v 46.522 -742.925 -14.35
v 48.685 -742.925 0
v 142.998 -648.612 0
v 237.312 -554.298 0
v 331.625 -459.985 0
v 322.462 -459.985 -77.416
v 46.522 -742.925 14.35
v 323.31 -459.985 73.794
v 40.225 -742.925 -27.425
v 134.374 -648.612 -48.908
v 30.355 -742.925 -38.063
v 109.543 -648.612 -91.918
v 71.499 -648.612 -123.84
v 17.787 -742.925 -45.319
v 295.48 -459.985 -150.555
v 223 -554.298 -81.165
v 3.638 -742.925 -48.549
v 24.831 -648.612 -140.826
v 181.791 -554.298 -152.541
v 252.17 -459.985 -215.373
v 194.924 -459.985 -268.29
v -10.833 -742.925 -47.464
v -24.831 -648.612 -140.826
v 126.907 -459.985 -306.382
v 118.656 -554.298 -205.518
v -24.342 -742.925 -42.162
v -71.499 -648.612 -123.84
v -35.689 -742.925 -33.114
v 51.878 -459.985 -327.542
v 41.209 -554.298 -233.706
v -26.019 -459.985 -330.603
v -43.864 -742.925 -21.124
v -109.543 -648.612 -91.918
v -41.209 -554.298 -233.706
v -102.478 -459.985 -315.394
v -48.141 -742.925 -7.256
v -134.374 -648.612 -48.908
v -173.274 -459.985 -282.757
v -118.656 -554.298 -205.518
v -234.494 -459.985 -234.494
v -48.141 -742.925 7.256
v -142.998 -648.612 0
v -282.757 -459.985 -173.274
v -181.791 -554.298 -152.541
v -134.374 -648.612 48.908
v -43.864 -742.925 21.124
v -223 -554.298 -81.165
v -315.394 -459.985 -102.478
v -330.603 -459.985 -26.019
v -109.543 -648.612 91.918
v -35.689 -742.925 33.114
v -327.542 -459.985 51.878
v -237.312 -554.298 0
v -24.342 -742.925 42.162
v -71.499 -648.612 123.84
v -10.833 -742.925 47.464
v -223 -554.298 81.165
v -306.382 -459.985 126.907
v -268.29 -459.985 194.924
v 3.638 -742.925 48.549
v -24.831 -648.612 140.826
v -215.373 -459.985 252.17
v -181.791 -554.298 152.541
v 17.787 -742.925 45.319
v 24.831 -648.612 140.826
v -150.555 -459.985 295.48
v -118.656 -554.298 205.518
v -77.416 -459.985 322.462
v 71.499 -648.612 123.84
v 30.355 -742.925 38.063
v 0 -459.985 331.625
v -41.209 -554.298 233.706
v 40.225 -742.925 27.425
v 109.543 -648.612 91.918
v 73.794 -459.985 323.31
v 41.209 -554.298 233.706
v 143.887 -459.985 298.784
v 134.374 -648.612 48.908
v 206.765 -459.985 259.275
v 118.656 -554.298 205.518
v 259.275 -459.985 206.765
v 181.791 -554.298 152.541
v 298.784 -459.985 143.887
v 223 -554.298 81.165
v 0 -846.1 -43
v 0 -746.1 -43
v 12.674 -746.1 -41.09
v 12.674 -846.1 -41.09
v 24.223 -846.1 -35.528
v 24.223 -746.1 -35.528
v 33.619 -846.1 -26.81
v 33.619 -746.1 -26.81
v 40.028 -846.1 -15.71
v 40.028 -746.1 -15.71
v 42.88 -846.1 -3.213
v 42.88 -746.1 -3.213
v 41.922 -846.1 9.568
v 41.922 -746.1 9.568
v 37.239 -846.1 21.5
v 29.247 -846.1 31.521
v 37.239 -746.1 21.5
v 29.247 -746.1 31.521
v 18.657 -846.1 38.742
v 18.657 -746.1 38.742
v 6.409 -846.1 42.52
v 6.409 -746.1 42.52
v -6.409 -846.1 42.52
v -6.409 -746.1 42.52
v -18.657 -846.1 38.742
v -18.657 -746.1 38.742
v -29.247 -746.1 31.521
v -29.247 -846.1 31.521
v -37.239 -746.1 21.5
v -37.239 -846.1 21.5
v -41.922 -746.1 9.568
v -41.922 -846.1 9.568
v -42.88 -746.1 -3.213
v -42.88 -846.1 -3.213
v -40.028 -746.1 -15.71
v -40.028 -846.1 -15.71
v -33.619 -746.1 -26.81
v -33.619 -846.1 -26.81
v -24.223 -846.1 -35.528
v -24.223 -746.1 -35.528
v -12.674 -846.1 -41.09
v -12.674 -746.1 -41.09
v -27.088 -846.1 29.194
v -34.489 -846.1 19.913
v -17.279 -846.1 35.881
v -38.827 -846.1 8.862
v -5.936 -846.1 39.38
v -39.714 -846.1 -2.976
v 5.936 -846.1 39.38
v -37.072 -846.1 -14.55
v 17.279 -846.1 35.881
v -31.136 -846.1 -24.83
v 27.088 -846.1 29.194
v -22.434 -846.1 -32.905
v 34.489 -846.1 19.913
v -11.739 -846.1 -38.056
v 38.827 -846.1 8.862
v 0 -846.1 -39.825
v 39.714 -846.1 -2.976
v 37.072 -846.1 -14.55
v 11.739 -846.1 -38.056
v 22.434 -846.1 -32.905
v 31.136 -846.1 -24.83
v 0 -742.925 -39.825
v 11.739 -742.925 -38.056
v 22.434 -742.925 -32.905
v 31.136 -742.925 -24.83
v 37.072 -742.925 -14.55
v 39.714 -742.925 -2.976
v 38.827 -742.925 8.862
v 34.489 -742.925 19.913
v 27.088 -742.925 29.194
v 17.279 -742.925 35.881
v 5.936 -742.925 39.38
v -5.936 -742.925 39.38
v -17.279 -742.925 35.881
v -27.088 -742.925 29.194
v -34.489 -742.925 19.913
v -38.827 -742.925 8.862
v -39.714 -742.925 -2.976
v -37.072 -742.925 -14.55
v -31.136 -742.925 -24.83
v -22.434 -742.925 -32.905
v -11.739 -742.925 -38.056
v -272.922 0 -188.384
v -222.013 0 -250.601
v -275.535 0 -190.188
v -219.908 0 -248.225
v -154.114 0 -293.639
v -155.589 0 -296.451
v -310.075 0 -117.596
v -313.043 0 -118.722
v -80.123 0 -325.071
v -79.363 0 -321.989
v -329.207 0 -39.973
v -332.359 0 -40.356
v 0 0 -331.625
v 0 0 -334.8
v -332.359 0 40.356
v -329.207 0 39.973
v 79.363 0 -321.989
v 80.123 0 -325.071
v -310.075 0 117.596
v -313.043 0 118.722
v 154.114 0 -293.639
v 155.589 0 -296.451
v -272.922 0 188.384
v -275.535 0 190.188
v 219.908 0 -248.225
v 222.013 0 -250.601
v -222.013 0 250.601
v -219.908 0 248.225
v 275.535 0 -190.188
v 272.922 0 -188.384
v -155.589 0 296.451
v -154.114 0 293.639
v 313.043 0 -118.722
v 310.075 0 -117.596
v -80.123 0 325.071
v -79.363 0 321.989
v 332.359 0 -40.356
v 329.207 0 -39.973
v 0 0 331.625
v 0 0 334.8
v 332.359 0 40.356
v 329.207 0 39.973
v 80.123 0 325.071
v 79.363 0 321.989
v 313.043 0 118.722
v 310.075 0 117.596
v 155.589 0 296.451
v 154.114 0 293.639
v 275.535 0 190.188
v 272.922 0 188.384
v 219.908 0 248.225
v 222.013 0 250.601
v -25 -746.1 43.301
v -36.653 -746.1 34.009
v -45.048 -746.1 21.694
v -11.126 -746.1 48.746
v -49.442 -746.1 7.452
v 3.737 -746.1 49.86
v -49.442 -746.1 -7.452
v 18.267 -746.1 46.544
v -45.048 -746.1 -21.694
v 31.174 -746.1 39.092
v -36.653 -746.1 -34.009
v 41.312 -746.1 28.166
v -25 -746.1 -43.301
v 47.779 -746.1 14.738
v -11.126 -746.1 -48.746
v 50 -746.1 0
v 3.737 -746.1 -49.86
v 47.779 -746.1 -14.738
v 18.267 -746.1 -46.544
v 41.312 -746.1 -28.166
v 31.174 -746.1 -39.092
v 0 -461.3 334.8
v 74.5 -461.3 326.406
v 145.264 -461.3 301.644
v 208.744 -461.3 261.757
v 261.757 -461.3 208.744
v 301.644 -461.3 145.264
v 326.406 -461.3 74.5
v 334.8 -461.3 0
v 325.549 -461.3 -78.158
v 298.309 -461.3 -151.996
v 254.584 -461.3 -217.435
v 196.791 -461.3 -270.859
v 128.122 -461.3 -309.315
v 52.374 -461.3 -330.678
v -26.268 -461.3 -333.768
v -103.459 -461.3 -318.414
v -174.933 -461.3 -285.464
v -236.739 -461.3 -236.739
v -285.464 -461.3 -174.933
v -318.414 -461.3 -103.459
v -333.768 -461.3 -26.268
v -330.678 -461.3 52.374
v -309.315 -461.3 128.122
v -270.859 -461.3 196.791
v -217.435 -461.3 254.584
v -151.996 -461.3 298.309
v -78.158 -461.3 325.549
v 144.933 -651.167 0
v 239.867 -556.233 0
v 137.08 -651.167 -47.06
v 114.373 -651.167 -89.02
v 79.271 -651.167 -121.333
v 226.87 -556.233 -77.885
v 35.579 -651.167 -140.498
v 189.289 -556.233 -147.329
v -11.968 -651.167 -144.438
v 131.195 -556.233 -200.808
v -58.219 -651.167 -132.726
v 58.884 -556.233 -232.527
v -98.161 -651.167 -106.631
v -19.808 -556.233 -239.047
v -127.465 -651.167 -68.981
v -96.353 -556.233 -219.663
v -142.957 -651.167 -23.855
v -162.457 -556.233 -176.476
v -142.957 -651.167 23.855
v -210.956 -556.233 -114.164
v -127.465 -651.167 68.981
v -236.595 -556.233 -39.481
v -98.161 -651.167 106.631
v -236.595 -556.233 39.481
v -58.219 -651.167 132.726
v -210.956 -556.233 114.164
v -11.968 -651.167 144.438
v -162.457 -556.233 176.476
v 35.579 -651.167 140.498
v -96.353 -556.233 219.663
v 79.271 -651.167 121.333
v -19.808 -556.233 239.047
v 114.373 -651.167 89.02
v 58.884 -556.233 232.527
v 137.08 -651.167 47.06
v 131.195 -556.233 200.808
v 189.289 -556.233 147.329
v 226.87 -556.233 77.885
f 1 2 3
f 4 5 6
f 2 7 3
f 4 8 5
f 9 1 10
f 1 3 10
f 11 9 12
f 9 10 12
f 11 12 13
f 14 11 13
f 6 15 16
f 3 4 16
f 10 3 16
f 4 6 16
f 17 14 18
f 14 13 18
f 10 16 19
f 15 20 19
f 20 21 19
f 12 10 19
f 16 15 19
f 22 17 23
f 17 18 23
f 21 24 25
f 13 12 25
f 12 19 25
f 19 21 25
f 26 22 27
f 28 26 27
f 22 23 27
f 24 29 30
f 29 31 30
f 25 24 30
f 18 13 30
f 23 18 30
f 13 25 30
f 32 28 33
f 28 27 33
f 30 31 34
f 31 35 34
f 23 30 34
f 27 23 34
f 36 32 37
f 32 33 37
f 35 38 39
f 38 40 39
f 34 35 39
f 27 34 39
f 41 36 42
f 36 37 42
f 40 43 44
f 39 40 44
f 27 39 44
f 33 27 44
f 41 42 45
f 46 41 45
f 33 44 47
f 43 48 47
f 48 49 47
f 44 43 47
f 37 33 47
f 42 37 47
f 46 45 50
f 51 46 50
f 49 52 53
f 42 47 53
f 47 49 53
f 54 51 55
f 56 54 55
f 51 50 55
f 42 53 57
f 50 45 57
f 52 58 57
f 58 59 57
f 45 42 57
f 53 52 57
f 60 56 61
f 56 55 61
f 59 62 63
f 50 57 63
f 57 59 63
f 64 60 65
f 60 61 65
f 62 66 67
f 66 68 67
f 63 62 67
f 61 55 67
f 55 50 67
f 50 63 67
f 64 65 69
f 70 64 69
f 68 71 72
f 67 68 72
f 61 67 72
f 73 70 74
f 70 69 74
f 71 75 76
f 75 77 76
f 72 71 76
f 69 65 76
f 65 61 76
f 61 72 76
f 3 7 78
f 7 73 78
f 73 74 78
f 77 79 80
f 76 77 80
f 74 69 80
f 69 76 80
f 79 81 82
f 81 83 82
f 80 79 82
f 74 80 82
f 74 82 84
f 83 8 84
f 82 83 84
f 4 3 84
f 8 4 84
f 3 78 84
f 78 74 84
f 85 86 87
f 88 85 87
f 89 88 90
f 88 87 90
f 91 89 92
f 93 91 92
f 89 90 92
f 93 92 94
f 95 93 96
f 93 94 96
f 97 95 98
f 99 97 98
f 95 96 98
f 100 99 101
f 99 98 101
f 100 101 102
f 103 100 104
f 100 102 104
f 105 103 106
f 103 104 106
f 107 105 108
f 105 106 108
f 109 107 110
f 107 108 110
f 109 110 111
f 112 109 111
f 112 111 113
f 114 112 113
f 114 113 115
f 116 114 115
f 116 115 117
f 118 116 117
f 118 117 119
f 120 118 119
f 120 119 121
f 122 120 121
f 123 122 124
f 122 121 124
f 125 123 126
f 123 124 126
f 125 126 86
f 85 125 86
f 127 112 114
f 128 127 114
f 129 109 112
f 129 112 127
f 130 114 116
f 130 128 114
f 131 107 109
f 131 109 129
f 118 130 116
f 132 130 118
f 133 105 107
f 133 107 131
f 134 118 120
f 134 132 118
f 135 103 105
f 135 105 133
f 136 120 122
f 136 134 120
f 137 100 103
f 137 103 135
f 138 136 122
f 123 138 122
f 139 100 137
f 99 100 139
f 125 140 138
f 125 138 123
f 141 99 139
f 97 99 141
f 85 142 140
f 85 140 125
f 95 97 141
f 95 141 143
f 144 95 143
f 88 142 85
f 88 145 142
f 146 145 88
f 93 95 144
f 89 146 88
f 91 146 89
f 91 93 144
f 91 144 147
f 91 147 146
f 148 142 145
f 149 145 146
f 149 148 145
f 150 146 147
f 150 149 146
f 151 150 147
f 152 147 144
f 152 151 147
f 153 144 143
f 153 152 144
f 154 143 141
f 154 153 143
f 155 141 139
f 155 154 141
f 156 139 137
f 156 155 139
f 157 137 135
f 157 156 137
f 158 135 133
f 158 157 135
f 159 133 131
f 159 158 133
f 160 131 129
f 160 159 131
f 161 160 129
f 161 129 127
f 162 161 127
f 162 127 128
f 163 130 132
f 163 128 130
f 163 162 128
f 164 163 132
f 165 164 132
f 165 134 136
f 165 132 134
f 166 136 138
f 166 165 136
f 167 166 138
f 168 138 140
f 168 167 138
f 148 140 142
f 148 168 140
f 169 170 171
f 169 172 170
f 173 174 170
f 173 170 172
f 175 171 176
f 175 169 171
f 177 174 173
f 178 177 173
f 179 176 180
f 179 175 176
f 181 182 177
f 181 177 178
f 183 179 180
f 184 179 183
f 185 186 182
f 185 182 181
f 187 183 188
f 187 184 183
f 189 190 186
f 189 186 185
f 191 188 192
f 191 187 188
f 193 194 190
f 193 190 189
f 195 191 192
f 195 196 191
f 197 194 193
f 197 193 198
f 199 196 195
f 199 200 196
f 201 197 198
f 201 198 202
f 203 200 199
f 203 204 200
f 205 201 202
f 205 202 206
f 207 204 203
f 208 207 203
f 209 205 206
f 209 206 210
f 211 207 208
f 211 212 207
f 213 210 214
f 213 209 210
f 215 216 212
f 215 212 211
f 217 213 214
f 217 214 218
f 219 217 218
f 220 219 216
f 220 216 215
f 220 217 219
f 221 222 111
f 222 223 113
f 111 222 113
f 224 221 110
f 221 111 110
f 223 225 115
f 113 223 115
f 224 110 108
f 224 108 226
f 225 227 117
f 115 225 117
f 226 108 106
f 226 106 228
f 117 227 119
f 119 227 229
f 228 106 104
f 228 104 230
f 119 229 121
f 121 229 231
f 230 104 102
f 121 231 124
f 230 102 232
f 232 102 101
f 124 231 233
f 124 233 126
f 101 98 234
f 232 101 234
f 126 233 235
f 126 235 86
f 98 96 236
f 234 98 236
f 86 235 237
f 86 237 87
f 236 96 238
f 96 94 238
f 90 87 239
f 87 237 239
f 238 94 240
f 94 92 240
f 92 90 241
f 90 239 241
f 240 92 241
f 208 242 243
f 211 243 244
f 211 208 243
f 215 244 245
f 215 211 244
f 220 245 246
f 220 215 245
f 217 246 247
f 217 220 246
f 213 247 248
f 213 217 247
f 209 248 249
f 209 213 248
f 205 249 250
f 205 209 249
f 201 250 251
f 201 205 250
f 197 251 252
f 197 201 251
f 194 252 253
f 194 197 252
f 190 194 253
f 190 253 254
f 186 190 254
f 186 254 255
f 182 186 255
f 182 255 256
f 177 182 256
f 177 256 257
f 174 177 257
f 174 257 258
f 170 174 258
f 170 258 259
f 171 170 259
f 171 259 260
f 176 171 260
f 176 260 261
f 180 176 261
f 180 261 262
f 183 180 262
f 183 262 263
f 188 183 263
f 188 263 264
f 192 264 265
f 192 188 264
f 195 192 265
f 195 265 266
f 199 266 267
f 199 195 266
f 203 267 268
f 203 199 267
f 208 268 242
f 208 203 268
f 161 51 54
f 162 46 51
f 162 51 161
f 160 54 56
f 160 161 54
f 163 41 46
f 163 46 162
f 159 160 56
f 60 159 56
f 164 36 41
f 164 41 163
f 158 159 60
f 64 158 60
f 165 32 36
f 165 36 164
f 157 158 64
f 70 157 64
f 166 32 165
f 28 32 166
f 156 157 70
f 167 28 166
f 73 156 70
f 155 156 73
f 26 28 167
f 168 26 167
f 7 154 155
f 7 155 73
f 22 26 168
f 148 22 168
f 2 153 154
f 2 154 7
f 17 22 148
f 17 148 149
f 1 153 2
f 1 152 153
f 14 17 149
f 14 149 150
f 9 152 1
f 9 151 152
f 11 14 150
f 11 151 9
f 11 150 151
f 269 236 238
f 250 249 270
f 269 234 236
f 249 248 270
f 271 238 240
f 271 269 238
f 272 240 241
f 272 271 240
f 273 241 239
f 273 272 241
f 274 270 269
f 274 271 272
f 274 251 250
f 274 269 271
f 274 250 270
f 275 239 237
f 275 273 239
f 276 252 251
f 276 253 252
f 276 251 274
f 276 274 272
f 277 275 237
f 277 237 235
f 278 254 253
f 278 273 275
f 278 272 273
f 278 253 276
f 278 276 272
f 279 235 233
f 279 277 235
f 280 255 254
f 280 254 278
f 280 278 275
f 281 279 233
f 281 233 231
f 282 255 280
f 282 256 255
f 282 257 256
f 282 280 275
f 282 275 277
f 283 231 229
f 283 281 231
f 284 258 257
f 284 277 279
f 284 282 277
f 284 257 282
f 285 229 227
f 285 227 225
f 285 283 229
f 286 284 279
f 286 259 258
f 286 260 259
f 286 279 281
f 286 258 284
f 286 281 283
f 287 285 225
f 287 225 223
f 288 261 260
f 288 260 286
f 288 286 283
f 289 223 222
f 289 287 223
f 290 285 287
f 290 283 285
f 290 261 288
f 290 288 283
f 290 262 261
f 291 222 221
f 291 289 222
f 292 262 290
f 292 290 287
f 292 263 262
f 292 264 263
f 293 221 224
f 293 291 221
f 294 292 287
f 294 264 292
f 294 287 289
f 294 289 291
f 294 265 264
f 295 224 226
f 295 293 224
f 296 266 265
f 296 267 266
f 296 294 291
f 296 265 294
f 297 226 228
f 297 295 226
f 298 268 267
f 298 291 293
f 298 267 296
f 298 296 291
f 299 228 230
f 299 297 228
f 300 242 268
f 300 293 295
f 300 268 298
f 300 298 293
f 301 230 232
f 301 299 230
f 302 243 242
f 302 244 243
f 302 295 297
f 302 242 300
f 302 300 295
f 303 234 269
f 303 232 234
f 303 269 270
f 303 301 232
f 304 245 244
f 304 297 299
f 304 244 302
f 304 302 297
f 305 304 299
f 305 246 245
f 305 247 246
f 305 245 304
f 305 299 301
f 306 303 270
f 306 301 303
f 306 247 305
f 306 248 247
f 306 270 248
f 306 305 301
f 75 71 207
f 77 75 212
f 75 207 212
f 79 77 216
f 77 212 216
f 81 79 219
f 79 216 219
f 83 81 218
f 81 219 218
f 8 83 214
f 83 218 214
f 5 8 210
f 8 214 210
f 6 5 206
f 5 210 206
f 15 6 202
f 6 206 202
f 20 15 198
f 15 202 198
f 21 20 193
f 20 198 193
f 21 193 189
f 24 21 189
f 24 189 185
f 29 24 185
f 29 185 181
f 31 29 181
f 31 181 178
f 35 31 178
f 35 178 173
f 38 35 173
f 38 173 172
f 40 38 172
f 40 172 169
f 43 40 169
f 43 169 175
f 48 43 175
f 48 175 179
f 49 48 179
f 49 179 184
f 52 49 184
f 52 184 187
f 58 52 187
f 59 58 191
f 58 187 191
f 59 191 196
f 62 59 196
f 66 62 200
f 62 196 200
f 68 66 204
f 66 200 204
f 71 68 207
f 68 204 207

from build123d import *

# Parameters (mm, degrees)
CROQUIS1_R              = 334.8
SALIENTE_EXTRUIR1_DEPTH = 461.3
CROQUIS3_R              = 50
CROQUIS2_R              = 334.8
CROQUIS4_R              = 43
SALIENTE_EXTRUIR2_DEPTH = 100
VACIADO1_T              = -3.175


with BuildPart() as part:
    # Croquis1 → Saliente-Extruir1 (new body)
    with BuildSketch(Plane(origin=(0, 0, 0), x_dir=(1, 0, 0), z_dir=(0, 1, 0))):
        with Locations(Location((0, 0, 0), (0, 0, 270))):
            Circle(CROQUIS1_R)
    extrude(amount=-SALIENTE_EXTRUIR1_DEPTH)

    # Croquis3 → Recubrir1 section 0
    with BuildSketch(Plane(origin=(0, -746.1, 0), x_dir=(1, 0, 0), z_dir=(0, 1, 0))):
        Circle(CROQUIS3_R)
    # Croquis2 → Recubrir1 section 1
    with BuildSketch(Plane.XZ.offset(461.3)):
        Circle(CROQUIS2_R)
    loft()

    # Croquis4 → Saliente-Extruir2 (add)
    with BuildSketch(Plane.XZ.offset(746.1)):
        with Locations(Location((0, 0, 0), (0, 0, 270))):
            Circle(CROQUIS4_R)
    extrude(amount=SALIENTE_EXTRUIR2_DEPTH)

    # Vaciado1
    vaciado1_openings = [part.faces().sort_by_distance(p)[0] for p in [
        (0, -846.1, 0),
        (0, 0, 0),
    ]]
    offset(amount=VACIADO1_T, openings=vaciado1_openings, kind=Kind.INTERSECTION)


solid = part.part
